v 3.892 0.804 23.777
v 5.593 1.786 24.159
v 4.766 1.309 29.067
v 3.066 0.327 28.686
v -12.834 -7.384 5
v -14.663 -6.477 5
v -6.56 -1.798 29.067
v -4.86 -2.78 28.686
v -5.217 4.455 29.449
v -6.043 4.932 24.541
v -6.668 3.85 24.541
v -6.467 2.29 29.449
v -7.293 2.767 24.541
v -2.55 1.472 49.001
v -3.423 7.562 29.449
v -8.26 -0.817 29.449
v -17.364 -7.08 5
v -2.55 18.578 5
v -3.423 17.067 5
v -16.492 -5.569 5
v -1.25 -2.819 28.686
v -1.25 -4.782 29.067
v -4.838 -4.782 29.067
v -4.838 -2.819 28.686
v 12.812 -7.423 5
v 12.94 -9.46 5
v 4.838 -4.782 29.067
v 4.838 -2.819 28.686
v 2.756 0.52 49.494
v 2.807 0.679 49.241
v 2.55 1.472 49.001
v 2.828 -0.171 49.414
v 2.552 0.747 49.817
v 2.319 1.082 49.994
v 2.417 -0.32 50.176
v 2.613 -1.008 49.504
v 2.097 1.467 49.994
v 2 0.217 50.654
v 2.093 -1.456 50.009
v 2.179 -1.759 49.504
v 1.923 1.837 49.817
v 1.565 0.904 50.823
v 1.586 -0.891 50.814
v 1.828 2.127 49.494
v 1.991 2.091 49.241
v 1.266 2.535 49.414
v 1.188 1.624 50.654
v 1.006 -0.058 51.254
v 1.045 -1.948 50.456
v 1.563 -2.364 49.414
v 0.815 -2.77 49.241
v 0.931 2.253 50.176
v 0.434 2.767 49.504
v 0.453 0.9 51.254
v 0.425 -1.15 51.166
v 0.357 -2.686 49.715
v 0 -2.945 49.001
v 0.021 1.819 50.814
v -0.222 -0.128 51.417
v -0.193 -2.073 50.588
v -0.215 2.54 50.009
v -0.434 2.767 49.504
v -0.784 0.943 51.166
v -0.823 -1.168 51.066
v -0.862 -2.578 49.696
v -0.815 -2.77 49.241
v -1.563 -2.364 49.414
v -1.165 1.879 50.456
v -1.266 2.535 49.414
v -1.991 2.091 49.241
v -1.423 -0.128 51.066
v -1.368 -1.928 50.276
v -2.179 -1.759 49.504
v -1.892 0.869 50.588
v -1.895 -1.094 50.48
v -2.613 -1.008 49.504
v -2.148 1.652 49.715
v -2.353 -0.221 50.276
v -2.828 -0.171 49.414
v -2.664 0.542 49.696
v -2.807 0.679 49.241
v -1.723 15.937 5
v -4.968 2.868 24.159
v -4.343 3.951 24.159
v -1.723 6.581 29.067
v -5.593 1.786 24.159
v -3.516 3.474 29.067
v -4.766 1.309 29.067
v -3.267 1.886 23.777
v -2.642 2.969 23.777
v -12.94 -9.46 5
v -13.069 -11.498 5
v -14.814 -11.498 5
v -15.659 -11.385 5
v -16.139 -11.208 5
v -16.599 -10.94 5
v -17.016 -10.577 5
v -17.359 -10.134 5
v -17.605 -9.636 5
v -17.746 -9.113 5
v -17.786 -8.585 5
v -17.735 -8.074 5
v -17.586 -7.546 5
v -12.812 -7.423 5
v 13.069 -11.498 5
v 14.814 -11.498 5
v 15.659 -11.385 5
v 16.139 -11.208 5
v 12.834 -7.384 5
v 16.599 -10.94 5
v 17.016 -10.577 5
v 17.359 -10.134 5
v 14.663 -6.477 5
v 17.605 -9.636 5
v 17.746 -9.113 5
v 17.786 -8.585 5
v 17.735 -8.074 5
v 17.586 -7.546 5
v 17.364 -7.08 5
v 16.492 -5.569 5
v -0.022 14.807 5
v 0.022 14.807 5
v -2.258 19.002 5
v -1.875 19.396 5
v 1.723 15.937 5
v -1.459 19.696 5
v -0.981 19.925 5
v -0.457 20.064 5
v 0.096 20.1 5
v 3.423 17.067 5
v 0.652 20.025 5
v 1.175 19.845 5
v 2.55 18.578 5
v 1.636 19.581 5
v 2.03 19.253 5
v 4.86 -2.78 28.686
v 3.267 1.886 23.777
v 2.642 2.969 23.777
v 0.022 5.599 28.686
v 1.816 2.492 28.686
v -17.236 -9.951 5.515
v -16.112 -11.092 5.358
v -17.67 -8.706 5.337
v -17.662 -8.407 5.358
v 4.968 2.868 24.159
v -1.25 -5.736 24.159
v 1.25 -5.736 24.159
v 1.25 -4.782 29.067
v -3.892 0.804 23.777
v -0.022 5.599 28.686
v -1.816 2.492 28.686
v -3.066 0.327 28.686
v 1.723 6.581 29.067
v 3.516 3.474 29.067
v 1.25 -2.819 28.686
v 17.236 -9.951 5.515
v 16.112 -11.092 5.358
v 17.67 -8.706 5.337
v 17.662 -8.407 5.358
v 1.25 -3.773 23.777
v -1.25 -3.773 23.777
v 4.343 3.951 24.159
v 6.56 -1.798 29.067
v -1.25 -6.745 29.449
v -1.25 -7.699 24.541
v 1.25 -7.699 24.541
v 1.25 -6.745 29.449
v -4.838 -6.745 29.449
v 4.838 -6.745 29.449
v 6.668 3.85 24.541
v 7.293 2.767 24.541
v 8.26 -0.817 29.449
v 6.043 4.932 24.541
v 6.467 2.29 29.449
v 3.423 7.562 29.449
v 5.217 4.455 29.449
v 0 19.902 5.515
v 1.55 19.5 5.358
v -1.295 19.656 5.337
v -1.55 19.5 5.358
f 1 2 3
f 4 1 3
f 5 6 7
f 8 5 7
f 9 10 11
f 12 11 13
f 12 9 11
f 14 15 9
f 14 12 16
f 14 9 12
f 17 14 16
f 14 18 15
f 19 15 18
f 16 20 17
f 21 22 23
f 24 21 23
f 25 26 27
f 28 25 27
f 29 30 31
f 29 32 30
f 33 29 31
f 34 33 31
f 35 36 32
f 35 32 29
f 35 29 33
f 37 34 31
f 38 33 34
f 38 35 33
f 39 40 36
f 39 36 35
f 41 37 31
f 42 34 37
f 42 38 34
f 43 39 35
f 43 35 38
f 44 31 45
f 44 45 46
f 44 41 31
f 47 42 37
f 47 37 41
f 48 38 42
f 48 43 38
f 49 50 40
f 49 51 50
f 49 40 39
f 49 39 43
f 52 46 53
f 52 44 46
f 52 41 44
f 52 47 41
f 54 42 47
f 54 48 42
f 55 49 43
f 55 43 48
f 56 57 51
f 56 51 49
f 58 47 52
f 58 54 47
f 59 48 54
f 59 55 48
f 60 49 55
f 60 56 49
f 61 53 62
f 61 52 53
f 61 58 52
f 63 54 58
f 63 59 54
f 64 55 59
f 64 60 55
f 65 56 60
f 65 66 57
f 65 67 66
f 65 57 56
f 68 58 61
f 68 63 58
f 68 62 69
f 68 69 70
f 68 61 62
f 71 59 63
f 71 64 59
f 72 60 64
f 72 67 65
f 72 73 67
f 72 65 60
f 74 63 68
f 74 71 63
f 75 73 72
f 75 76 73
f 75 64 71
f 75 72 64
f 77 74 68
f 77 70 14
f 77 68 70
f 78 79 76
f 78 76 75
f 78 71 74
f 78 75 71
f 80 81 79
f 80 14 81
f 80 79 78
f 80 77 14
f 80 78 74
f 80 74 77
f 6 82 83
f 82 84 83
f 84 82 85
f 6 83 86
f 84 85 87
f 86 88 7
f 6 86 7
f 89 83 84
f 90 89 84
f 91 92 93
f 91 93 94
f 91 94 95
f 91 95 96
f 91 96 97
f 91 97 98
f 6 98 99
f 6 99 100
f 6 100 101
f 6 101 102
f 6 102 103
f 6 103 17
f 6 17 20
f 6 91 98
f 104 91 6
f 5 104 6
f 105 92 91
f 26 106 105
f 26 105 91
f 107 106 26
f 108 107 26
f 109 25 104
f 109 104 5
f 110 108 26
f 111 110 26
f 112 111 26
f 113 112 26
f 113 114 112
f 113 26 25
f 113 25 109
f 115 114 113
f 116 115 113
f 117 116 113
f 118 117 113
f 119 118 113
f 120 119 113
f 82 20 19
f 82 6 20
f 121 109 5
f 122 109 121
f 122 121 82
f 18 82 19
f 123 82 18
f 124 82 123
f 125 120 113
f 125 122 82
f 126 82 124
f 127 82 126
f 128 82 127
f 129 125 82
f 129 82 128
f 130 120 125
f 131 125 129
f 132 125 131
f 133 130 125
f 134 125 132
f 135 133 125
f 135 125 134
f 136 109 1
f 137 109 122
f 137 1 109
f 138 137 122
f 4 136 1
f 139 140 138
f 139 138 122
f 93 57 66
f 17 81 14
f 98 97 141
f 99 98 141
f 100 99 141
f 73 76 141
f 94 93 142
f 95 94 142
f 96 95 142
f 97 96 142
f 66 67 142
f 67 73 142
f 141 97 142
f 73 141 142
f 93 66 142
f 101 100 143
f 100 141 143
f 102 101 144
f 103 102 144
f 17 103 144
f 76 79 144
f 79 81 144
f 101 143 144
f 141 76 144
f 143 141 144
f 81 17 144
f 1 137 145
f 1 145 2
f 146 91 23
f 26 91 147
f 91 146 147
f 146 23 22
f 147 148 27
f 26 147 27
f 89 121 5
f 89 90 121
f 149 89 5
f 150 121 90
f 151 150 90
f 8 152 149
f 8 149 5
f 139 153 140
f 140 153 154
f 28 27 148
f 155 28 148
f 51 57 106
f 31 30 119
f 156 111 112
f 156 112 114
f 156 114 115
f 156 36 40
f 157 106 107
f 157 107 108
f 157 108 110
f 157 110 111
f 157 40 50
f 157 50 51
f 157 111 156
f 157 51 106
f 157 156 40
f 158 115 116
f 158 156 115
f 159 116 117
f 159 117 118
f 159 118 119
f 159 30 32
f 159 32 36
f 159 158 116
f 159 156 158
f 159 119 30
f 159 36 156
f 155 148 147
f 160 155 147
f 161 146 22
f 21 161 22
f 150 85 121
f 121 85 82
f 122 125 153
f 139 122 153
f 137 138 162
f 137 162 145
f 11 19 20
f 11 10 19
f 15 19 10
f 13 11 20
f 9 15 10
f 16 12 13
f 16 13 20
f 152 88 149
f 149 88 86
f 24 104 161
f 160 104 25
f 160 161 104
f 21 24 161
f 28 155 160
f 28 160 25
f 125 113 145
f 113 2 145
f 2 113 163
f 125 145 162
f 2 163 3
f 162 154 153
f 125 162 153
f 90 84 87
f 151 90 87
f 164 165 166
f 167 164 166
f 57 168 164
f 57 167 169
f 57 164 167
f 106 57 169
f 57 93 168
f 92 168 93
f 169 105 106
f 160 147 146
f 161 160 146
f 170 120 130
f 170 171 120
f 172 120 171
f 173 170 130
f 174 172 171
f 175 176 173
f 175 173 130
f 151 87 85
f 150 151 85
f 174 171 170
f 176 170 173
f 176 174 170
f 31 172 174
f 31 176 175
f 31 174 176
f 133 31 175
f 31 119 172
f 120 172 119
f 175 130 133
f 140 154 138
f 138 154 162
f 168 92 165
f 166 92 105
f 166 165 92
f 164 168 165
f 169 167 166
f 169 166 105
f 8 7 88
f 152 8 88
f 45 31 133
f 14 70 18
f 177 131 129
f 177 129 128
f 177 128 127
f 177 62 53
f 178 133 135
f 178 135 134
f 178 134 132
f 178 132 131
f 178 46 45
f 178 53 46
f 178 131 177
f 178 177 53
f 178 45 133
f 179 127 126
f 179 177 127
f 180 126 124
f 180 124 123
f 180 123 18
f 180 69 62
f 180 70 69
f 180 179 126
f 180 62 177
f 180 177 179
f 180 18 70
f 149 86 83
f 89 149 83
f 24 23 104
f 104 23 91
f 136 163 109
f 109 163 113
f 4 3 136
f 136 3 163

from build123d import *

# Parameters (mm, degrees)
F3_DEPTH        = 4
F5_DEPTH        = 4
F7_DEPTH        = 4
F8_DEPTH        = 2
F8_COPIES_COUNT = 3
F10_W           = 40
F10_H           = 6
F11_DEPTH       = 25
F11_DEPTH_BACK  = 25
F12_R           = 3


# Not quite as in the source:
# - an extrude whose draft closes it to a point is written as a loft to that point
# - a feature of the source that left no trace in its solid (it failed there, or was rolled back) is left out
# - a pattern or mirror of a feature is missing from the dataset's text; its kind, count and spacing are read off the source's solid


with BuildPart() as f0:
    # F13 (on Top) → F0 section 0
    with BuildSketch(Plane.XY, mode=Mode.PRIVATE) as f0_s0:
        Polygon((-21.5980762114, -12.4696551146), (21.5980762114, -12.4696551146), (0, 24.9393102292), align=None)
    loft([f0_s0.sketch, Vertex(0, 0, 64.1508142976)], ruled=True)

    # F1 (on face) → F3 (cut)
    with BuildSketch(Plane(origin=(0, -12.0156590044, 2.3356075118), x_dir=(1, 0, 0), z_dir=(0, -0.9816271834, 0.1908089954))):
        Polygon((-4.8375685578, 27.6206776349), (-14.7522947938, -2.3793223651), (0, -2.3793223651), (14.7522947938, -2.3793223651), (4.8375685578, 27.6206776349), (1.25, 27.6206776349), (1.25, 22.6206776349), (0, 22.6206776349), (-1.25, 22.6206776349), (-1.25, 27.6206776349), align=None)
    extrude(amount=-F3_DEPTH, mode=Mode.SUBTRACT)

    # F4 (on face) → F5 (cut)
    with BuildSketch(Plane(origin=(10.4058659411, 6.0078295022, 2.3356075118), x_dir=(-0.4788987638, 0.8712646086, -0.1074893292), z_dir=(0.8501140779, 0.4908135917, 0.1908089954))):
        Polygon((-7.8329752774, 26.9248658467), (-14.40304573, -3.980408308), (0.2605385928, -2.3650147058), (14.9241229157, -0.7496211036), (1.7839820104, 27.9843047215), (-1.7820133006, 27.5914617519), (-1.2345074295, 22.6215284202), (-2.4769907625, 22.4846519525), (-3.7194740954, 22.3477754847), (-4.2669799664, 27.3177088164), align=None)
    extrude(amount=-F5_DEPTH, mode=Mode.SUBTRACT)

    # F6 (on face) → F7 (cut)
    with BuildSketch(Plane(origin=(-10.4058659411, 6.0078295022, 2.3356075118), x_dir=(-0.4788987638, -0.8712646086, 0.1074893292), z_dir=(-0.8501140779, 0.4908135917, 0.1908089954))):
        Polygon((-1.7839820104, 27.9843047215), (-14.9241229157, -0.7496211036), (-0.2605385928, -2.3650147058), (14.40304573, -3.980408308), (7.8329752774, 26.9248658467), (4.2669799664, 27.3177088164), (3.7194740954, 22.3477754847), (2.4769907625, 22.4846519525), (1.2345074295, 22.6215284202), (1.7820133006, 27.5914617519), align=None)
    extrude(amount=-F7_DEPTH, mode=Mode.SUBTRACT)

    # F1 (on face) → F8 (join)
    with BuildSketch(Plane(origin=(0, -12.0156590044, 2.3356075118), x_dir=(1, 0, 0), z_dir=(0, -0.9816271834, 0.1908089954))):
        Polygon((-4.8375685578, 27.6206776349), (-14.7522947938, -2.3793223651), (0, -2.3793223651), (14.7522947938, -2.3793223651), (4.8375685578, 27.6206776349), (1.25, 27.6206776349), (1.25, 22.6206776349), (0, 22.6206776349), (-1.25, 22.6206776349), (-1.25, 27.6206776349), align=None)
    f8 = extrude(amount=-F8_DEPTH)

    # F8_copies: F8 ×3 about axis
    f8_copies_axis = Axis((0, 0, 0), (0, 0, 1))
    for i in range(1, F8_COPIES_COUNT):
        add(f8.rotate(f8_copies_axis, i * 360 / F8_COPIES_COUNT))

    # F10 (on Right) → F11 (cut, two sides)
    with BuildSketch(Plane.YZ) as f11_sk:
        with Locations((6, 2)):
            Rectangle(F10_W, F10_H)
    extrude(amount=-F11_DEPTH, mode=Mode.SUBTRACT)
    extrude(f11_sk.sketch, amount=F11_DEPTH_BACK, mode=Mode.SUBTRACT)

    # F12
    f12_edges = [f0.edges().sort_by_distance(p)[0] for p in [
        (-9.957347, -5.748877, 34.575407),
        (9.957347, -5.748877, 34.575407),
        (0, 11.497754, 34.575407),
    ]]
    fillet(f12_edges, radius=F12_R)


solid = f0.part
